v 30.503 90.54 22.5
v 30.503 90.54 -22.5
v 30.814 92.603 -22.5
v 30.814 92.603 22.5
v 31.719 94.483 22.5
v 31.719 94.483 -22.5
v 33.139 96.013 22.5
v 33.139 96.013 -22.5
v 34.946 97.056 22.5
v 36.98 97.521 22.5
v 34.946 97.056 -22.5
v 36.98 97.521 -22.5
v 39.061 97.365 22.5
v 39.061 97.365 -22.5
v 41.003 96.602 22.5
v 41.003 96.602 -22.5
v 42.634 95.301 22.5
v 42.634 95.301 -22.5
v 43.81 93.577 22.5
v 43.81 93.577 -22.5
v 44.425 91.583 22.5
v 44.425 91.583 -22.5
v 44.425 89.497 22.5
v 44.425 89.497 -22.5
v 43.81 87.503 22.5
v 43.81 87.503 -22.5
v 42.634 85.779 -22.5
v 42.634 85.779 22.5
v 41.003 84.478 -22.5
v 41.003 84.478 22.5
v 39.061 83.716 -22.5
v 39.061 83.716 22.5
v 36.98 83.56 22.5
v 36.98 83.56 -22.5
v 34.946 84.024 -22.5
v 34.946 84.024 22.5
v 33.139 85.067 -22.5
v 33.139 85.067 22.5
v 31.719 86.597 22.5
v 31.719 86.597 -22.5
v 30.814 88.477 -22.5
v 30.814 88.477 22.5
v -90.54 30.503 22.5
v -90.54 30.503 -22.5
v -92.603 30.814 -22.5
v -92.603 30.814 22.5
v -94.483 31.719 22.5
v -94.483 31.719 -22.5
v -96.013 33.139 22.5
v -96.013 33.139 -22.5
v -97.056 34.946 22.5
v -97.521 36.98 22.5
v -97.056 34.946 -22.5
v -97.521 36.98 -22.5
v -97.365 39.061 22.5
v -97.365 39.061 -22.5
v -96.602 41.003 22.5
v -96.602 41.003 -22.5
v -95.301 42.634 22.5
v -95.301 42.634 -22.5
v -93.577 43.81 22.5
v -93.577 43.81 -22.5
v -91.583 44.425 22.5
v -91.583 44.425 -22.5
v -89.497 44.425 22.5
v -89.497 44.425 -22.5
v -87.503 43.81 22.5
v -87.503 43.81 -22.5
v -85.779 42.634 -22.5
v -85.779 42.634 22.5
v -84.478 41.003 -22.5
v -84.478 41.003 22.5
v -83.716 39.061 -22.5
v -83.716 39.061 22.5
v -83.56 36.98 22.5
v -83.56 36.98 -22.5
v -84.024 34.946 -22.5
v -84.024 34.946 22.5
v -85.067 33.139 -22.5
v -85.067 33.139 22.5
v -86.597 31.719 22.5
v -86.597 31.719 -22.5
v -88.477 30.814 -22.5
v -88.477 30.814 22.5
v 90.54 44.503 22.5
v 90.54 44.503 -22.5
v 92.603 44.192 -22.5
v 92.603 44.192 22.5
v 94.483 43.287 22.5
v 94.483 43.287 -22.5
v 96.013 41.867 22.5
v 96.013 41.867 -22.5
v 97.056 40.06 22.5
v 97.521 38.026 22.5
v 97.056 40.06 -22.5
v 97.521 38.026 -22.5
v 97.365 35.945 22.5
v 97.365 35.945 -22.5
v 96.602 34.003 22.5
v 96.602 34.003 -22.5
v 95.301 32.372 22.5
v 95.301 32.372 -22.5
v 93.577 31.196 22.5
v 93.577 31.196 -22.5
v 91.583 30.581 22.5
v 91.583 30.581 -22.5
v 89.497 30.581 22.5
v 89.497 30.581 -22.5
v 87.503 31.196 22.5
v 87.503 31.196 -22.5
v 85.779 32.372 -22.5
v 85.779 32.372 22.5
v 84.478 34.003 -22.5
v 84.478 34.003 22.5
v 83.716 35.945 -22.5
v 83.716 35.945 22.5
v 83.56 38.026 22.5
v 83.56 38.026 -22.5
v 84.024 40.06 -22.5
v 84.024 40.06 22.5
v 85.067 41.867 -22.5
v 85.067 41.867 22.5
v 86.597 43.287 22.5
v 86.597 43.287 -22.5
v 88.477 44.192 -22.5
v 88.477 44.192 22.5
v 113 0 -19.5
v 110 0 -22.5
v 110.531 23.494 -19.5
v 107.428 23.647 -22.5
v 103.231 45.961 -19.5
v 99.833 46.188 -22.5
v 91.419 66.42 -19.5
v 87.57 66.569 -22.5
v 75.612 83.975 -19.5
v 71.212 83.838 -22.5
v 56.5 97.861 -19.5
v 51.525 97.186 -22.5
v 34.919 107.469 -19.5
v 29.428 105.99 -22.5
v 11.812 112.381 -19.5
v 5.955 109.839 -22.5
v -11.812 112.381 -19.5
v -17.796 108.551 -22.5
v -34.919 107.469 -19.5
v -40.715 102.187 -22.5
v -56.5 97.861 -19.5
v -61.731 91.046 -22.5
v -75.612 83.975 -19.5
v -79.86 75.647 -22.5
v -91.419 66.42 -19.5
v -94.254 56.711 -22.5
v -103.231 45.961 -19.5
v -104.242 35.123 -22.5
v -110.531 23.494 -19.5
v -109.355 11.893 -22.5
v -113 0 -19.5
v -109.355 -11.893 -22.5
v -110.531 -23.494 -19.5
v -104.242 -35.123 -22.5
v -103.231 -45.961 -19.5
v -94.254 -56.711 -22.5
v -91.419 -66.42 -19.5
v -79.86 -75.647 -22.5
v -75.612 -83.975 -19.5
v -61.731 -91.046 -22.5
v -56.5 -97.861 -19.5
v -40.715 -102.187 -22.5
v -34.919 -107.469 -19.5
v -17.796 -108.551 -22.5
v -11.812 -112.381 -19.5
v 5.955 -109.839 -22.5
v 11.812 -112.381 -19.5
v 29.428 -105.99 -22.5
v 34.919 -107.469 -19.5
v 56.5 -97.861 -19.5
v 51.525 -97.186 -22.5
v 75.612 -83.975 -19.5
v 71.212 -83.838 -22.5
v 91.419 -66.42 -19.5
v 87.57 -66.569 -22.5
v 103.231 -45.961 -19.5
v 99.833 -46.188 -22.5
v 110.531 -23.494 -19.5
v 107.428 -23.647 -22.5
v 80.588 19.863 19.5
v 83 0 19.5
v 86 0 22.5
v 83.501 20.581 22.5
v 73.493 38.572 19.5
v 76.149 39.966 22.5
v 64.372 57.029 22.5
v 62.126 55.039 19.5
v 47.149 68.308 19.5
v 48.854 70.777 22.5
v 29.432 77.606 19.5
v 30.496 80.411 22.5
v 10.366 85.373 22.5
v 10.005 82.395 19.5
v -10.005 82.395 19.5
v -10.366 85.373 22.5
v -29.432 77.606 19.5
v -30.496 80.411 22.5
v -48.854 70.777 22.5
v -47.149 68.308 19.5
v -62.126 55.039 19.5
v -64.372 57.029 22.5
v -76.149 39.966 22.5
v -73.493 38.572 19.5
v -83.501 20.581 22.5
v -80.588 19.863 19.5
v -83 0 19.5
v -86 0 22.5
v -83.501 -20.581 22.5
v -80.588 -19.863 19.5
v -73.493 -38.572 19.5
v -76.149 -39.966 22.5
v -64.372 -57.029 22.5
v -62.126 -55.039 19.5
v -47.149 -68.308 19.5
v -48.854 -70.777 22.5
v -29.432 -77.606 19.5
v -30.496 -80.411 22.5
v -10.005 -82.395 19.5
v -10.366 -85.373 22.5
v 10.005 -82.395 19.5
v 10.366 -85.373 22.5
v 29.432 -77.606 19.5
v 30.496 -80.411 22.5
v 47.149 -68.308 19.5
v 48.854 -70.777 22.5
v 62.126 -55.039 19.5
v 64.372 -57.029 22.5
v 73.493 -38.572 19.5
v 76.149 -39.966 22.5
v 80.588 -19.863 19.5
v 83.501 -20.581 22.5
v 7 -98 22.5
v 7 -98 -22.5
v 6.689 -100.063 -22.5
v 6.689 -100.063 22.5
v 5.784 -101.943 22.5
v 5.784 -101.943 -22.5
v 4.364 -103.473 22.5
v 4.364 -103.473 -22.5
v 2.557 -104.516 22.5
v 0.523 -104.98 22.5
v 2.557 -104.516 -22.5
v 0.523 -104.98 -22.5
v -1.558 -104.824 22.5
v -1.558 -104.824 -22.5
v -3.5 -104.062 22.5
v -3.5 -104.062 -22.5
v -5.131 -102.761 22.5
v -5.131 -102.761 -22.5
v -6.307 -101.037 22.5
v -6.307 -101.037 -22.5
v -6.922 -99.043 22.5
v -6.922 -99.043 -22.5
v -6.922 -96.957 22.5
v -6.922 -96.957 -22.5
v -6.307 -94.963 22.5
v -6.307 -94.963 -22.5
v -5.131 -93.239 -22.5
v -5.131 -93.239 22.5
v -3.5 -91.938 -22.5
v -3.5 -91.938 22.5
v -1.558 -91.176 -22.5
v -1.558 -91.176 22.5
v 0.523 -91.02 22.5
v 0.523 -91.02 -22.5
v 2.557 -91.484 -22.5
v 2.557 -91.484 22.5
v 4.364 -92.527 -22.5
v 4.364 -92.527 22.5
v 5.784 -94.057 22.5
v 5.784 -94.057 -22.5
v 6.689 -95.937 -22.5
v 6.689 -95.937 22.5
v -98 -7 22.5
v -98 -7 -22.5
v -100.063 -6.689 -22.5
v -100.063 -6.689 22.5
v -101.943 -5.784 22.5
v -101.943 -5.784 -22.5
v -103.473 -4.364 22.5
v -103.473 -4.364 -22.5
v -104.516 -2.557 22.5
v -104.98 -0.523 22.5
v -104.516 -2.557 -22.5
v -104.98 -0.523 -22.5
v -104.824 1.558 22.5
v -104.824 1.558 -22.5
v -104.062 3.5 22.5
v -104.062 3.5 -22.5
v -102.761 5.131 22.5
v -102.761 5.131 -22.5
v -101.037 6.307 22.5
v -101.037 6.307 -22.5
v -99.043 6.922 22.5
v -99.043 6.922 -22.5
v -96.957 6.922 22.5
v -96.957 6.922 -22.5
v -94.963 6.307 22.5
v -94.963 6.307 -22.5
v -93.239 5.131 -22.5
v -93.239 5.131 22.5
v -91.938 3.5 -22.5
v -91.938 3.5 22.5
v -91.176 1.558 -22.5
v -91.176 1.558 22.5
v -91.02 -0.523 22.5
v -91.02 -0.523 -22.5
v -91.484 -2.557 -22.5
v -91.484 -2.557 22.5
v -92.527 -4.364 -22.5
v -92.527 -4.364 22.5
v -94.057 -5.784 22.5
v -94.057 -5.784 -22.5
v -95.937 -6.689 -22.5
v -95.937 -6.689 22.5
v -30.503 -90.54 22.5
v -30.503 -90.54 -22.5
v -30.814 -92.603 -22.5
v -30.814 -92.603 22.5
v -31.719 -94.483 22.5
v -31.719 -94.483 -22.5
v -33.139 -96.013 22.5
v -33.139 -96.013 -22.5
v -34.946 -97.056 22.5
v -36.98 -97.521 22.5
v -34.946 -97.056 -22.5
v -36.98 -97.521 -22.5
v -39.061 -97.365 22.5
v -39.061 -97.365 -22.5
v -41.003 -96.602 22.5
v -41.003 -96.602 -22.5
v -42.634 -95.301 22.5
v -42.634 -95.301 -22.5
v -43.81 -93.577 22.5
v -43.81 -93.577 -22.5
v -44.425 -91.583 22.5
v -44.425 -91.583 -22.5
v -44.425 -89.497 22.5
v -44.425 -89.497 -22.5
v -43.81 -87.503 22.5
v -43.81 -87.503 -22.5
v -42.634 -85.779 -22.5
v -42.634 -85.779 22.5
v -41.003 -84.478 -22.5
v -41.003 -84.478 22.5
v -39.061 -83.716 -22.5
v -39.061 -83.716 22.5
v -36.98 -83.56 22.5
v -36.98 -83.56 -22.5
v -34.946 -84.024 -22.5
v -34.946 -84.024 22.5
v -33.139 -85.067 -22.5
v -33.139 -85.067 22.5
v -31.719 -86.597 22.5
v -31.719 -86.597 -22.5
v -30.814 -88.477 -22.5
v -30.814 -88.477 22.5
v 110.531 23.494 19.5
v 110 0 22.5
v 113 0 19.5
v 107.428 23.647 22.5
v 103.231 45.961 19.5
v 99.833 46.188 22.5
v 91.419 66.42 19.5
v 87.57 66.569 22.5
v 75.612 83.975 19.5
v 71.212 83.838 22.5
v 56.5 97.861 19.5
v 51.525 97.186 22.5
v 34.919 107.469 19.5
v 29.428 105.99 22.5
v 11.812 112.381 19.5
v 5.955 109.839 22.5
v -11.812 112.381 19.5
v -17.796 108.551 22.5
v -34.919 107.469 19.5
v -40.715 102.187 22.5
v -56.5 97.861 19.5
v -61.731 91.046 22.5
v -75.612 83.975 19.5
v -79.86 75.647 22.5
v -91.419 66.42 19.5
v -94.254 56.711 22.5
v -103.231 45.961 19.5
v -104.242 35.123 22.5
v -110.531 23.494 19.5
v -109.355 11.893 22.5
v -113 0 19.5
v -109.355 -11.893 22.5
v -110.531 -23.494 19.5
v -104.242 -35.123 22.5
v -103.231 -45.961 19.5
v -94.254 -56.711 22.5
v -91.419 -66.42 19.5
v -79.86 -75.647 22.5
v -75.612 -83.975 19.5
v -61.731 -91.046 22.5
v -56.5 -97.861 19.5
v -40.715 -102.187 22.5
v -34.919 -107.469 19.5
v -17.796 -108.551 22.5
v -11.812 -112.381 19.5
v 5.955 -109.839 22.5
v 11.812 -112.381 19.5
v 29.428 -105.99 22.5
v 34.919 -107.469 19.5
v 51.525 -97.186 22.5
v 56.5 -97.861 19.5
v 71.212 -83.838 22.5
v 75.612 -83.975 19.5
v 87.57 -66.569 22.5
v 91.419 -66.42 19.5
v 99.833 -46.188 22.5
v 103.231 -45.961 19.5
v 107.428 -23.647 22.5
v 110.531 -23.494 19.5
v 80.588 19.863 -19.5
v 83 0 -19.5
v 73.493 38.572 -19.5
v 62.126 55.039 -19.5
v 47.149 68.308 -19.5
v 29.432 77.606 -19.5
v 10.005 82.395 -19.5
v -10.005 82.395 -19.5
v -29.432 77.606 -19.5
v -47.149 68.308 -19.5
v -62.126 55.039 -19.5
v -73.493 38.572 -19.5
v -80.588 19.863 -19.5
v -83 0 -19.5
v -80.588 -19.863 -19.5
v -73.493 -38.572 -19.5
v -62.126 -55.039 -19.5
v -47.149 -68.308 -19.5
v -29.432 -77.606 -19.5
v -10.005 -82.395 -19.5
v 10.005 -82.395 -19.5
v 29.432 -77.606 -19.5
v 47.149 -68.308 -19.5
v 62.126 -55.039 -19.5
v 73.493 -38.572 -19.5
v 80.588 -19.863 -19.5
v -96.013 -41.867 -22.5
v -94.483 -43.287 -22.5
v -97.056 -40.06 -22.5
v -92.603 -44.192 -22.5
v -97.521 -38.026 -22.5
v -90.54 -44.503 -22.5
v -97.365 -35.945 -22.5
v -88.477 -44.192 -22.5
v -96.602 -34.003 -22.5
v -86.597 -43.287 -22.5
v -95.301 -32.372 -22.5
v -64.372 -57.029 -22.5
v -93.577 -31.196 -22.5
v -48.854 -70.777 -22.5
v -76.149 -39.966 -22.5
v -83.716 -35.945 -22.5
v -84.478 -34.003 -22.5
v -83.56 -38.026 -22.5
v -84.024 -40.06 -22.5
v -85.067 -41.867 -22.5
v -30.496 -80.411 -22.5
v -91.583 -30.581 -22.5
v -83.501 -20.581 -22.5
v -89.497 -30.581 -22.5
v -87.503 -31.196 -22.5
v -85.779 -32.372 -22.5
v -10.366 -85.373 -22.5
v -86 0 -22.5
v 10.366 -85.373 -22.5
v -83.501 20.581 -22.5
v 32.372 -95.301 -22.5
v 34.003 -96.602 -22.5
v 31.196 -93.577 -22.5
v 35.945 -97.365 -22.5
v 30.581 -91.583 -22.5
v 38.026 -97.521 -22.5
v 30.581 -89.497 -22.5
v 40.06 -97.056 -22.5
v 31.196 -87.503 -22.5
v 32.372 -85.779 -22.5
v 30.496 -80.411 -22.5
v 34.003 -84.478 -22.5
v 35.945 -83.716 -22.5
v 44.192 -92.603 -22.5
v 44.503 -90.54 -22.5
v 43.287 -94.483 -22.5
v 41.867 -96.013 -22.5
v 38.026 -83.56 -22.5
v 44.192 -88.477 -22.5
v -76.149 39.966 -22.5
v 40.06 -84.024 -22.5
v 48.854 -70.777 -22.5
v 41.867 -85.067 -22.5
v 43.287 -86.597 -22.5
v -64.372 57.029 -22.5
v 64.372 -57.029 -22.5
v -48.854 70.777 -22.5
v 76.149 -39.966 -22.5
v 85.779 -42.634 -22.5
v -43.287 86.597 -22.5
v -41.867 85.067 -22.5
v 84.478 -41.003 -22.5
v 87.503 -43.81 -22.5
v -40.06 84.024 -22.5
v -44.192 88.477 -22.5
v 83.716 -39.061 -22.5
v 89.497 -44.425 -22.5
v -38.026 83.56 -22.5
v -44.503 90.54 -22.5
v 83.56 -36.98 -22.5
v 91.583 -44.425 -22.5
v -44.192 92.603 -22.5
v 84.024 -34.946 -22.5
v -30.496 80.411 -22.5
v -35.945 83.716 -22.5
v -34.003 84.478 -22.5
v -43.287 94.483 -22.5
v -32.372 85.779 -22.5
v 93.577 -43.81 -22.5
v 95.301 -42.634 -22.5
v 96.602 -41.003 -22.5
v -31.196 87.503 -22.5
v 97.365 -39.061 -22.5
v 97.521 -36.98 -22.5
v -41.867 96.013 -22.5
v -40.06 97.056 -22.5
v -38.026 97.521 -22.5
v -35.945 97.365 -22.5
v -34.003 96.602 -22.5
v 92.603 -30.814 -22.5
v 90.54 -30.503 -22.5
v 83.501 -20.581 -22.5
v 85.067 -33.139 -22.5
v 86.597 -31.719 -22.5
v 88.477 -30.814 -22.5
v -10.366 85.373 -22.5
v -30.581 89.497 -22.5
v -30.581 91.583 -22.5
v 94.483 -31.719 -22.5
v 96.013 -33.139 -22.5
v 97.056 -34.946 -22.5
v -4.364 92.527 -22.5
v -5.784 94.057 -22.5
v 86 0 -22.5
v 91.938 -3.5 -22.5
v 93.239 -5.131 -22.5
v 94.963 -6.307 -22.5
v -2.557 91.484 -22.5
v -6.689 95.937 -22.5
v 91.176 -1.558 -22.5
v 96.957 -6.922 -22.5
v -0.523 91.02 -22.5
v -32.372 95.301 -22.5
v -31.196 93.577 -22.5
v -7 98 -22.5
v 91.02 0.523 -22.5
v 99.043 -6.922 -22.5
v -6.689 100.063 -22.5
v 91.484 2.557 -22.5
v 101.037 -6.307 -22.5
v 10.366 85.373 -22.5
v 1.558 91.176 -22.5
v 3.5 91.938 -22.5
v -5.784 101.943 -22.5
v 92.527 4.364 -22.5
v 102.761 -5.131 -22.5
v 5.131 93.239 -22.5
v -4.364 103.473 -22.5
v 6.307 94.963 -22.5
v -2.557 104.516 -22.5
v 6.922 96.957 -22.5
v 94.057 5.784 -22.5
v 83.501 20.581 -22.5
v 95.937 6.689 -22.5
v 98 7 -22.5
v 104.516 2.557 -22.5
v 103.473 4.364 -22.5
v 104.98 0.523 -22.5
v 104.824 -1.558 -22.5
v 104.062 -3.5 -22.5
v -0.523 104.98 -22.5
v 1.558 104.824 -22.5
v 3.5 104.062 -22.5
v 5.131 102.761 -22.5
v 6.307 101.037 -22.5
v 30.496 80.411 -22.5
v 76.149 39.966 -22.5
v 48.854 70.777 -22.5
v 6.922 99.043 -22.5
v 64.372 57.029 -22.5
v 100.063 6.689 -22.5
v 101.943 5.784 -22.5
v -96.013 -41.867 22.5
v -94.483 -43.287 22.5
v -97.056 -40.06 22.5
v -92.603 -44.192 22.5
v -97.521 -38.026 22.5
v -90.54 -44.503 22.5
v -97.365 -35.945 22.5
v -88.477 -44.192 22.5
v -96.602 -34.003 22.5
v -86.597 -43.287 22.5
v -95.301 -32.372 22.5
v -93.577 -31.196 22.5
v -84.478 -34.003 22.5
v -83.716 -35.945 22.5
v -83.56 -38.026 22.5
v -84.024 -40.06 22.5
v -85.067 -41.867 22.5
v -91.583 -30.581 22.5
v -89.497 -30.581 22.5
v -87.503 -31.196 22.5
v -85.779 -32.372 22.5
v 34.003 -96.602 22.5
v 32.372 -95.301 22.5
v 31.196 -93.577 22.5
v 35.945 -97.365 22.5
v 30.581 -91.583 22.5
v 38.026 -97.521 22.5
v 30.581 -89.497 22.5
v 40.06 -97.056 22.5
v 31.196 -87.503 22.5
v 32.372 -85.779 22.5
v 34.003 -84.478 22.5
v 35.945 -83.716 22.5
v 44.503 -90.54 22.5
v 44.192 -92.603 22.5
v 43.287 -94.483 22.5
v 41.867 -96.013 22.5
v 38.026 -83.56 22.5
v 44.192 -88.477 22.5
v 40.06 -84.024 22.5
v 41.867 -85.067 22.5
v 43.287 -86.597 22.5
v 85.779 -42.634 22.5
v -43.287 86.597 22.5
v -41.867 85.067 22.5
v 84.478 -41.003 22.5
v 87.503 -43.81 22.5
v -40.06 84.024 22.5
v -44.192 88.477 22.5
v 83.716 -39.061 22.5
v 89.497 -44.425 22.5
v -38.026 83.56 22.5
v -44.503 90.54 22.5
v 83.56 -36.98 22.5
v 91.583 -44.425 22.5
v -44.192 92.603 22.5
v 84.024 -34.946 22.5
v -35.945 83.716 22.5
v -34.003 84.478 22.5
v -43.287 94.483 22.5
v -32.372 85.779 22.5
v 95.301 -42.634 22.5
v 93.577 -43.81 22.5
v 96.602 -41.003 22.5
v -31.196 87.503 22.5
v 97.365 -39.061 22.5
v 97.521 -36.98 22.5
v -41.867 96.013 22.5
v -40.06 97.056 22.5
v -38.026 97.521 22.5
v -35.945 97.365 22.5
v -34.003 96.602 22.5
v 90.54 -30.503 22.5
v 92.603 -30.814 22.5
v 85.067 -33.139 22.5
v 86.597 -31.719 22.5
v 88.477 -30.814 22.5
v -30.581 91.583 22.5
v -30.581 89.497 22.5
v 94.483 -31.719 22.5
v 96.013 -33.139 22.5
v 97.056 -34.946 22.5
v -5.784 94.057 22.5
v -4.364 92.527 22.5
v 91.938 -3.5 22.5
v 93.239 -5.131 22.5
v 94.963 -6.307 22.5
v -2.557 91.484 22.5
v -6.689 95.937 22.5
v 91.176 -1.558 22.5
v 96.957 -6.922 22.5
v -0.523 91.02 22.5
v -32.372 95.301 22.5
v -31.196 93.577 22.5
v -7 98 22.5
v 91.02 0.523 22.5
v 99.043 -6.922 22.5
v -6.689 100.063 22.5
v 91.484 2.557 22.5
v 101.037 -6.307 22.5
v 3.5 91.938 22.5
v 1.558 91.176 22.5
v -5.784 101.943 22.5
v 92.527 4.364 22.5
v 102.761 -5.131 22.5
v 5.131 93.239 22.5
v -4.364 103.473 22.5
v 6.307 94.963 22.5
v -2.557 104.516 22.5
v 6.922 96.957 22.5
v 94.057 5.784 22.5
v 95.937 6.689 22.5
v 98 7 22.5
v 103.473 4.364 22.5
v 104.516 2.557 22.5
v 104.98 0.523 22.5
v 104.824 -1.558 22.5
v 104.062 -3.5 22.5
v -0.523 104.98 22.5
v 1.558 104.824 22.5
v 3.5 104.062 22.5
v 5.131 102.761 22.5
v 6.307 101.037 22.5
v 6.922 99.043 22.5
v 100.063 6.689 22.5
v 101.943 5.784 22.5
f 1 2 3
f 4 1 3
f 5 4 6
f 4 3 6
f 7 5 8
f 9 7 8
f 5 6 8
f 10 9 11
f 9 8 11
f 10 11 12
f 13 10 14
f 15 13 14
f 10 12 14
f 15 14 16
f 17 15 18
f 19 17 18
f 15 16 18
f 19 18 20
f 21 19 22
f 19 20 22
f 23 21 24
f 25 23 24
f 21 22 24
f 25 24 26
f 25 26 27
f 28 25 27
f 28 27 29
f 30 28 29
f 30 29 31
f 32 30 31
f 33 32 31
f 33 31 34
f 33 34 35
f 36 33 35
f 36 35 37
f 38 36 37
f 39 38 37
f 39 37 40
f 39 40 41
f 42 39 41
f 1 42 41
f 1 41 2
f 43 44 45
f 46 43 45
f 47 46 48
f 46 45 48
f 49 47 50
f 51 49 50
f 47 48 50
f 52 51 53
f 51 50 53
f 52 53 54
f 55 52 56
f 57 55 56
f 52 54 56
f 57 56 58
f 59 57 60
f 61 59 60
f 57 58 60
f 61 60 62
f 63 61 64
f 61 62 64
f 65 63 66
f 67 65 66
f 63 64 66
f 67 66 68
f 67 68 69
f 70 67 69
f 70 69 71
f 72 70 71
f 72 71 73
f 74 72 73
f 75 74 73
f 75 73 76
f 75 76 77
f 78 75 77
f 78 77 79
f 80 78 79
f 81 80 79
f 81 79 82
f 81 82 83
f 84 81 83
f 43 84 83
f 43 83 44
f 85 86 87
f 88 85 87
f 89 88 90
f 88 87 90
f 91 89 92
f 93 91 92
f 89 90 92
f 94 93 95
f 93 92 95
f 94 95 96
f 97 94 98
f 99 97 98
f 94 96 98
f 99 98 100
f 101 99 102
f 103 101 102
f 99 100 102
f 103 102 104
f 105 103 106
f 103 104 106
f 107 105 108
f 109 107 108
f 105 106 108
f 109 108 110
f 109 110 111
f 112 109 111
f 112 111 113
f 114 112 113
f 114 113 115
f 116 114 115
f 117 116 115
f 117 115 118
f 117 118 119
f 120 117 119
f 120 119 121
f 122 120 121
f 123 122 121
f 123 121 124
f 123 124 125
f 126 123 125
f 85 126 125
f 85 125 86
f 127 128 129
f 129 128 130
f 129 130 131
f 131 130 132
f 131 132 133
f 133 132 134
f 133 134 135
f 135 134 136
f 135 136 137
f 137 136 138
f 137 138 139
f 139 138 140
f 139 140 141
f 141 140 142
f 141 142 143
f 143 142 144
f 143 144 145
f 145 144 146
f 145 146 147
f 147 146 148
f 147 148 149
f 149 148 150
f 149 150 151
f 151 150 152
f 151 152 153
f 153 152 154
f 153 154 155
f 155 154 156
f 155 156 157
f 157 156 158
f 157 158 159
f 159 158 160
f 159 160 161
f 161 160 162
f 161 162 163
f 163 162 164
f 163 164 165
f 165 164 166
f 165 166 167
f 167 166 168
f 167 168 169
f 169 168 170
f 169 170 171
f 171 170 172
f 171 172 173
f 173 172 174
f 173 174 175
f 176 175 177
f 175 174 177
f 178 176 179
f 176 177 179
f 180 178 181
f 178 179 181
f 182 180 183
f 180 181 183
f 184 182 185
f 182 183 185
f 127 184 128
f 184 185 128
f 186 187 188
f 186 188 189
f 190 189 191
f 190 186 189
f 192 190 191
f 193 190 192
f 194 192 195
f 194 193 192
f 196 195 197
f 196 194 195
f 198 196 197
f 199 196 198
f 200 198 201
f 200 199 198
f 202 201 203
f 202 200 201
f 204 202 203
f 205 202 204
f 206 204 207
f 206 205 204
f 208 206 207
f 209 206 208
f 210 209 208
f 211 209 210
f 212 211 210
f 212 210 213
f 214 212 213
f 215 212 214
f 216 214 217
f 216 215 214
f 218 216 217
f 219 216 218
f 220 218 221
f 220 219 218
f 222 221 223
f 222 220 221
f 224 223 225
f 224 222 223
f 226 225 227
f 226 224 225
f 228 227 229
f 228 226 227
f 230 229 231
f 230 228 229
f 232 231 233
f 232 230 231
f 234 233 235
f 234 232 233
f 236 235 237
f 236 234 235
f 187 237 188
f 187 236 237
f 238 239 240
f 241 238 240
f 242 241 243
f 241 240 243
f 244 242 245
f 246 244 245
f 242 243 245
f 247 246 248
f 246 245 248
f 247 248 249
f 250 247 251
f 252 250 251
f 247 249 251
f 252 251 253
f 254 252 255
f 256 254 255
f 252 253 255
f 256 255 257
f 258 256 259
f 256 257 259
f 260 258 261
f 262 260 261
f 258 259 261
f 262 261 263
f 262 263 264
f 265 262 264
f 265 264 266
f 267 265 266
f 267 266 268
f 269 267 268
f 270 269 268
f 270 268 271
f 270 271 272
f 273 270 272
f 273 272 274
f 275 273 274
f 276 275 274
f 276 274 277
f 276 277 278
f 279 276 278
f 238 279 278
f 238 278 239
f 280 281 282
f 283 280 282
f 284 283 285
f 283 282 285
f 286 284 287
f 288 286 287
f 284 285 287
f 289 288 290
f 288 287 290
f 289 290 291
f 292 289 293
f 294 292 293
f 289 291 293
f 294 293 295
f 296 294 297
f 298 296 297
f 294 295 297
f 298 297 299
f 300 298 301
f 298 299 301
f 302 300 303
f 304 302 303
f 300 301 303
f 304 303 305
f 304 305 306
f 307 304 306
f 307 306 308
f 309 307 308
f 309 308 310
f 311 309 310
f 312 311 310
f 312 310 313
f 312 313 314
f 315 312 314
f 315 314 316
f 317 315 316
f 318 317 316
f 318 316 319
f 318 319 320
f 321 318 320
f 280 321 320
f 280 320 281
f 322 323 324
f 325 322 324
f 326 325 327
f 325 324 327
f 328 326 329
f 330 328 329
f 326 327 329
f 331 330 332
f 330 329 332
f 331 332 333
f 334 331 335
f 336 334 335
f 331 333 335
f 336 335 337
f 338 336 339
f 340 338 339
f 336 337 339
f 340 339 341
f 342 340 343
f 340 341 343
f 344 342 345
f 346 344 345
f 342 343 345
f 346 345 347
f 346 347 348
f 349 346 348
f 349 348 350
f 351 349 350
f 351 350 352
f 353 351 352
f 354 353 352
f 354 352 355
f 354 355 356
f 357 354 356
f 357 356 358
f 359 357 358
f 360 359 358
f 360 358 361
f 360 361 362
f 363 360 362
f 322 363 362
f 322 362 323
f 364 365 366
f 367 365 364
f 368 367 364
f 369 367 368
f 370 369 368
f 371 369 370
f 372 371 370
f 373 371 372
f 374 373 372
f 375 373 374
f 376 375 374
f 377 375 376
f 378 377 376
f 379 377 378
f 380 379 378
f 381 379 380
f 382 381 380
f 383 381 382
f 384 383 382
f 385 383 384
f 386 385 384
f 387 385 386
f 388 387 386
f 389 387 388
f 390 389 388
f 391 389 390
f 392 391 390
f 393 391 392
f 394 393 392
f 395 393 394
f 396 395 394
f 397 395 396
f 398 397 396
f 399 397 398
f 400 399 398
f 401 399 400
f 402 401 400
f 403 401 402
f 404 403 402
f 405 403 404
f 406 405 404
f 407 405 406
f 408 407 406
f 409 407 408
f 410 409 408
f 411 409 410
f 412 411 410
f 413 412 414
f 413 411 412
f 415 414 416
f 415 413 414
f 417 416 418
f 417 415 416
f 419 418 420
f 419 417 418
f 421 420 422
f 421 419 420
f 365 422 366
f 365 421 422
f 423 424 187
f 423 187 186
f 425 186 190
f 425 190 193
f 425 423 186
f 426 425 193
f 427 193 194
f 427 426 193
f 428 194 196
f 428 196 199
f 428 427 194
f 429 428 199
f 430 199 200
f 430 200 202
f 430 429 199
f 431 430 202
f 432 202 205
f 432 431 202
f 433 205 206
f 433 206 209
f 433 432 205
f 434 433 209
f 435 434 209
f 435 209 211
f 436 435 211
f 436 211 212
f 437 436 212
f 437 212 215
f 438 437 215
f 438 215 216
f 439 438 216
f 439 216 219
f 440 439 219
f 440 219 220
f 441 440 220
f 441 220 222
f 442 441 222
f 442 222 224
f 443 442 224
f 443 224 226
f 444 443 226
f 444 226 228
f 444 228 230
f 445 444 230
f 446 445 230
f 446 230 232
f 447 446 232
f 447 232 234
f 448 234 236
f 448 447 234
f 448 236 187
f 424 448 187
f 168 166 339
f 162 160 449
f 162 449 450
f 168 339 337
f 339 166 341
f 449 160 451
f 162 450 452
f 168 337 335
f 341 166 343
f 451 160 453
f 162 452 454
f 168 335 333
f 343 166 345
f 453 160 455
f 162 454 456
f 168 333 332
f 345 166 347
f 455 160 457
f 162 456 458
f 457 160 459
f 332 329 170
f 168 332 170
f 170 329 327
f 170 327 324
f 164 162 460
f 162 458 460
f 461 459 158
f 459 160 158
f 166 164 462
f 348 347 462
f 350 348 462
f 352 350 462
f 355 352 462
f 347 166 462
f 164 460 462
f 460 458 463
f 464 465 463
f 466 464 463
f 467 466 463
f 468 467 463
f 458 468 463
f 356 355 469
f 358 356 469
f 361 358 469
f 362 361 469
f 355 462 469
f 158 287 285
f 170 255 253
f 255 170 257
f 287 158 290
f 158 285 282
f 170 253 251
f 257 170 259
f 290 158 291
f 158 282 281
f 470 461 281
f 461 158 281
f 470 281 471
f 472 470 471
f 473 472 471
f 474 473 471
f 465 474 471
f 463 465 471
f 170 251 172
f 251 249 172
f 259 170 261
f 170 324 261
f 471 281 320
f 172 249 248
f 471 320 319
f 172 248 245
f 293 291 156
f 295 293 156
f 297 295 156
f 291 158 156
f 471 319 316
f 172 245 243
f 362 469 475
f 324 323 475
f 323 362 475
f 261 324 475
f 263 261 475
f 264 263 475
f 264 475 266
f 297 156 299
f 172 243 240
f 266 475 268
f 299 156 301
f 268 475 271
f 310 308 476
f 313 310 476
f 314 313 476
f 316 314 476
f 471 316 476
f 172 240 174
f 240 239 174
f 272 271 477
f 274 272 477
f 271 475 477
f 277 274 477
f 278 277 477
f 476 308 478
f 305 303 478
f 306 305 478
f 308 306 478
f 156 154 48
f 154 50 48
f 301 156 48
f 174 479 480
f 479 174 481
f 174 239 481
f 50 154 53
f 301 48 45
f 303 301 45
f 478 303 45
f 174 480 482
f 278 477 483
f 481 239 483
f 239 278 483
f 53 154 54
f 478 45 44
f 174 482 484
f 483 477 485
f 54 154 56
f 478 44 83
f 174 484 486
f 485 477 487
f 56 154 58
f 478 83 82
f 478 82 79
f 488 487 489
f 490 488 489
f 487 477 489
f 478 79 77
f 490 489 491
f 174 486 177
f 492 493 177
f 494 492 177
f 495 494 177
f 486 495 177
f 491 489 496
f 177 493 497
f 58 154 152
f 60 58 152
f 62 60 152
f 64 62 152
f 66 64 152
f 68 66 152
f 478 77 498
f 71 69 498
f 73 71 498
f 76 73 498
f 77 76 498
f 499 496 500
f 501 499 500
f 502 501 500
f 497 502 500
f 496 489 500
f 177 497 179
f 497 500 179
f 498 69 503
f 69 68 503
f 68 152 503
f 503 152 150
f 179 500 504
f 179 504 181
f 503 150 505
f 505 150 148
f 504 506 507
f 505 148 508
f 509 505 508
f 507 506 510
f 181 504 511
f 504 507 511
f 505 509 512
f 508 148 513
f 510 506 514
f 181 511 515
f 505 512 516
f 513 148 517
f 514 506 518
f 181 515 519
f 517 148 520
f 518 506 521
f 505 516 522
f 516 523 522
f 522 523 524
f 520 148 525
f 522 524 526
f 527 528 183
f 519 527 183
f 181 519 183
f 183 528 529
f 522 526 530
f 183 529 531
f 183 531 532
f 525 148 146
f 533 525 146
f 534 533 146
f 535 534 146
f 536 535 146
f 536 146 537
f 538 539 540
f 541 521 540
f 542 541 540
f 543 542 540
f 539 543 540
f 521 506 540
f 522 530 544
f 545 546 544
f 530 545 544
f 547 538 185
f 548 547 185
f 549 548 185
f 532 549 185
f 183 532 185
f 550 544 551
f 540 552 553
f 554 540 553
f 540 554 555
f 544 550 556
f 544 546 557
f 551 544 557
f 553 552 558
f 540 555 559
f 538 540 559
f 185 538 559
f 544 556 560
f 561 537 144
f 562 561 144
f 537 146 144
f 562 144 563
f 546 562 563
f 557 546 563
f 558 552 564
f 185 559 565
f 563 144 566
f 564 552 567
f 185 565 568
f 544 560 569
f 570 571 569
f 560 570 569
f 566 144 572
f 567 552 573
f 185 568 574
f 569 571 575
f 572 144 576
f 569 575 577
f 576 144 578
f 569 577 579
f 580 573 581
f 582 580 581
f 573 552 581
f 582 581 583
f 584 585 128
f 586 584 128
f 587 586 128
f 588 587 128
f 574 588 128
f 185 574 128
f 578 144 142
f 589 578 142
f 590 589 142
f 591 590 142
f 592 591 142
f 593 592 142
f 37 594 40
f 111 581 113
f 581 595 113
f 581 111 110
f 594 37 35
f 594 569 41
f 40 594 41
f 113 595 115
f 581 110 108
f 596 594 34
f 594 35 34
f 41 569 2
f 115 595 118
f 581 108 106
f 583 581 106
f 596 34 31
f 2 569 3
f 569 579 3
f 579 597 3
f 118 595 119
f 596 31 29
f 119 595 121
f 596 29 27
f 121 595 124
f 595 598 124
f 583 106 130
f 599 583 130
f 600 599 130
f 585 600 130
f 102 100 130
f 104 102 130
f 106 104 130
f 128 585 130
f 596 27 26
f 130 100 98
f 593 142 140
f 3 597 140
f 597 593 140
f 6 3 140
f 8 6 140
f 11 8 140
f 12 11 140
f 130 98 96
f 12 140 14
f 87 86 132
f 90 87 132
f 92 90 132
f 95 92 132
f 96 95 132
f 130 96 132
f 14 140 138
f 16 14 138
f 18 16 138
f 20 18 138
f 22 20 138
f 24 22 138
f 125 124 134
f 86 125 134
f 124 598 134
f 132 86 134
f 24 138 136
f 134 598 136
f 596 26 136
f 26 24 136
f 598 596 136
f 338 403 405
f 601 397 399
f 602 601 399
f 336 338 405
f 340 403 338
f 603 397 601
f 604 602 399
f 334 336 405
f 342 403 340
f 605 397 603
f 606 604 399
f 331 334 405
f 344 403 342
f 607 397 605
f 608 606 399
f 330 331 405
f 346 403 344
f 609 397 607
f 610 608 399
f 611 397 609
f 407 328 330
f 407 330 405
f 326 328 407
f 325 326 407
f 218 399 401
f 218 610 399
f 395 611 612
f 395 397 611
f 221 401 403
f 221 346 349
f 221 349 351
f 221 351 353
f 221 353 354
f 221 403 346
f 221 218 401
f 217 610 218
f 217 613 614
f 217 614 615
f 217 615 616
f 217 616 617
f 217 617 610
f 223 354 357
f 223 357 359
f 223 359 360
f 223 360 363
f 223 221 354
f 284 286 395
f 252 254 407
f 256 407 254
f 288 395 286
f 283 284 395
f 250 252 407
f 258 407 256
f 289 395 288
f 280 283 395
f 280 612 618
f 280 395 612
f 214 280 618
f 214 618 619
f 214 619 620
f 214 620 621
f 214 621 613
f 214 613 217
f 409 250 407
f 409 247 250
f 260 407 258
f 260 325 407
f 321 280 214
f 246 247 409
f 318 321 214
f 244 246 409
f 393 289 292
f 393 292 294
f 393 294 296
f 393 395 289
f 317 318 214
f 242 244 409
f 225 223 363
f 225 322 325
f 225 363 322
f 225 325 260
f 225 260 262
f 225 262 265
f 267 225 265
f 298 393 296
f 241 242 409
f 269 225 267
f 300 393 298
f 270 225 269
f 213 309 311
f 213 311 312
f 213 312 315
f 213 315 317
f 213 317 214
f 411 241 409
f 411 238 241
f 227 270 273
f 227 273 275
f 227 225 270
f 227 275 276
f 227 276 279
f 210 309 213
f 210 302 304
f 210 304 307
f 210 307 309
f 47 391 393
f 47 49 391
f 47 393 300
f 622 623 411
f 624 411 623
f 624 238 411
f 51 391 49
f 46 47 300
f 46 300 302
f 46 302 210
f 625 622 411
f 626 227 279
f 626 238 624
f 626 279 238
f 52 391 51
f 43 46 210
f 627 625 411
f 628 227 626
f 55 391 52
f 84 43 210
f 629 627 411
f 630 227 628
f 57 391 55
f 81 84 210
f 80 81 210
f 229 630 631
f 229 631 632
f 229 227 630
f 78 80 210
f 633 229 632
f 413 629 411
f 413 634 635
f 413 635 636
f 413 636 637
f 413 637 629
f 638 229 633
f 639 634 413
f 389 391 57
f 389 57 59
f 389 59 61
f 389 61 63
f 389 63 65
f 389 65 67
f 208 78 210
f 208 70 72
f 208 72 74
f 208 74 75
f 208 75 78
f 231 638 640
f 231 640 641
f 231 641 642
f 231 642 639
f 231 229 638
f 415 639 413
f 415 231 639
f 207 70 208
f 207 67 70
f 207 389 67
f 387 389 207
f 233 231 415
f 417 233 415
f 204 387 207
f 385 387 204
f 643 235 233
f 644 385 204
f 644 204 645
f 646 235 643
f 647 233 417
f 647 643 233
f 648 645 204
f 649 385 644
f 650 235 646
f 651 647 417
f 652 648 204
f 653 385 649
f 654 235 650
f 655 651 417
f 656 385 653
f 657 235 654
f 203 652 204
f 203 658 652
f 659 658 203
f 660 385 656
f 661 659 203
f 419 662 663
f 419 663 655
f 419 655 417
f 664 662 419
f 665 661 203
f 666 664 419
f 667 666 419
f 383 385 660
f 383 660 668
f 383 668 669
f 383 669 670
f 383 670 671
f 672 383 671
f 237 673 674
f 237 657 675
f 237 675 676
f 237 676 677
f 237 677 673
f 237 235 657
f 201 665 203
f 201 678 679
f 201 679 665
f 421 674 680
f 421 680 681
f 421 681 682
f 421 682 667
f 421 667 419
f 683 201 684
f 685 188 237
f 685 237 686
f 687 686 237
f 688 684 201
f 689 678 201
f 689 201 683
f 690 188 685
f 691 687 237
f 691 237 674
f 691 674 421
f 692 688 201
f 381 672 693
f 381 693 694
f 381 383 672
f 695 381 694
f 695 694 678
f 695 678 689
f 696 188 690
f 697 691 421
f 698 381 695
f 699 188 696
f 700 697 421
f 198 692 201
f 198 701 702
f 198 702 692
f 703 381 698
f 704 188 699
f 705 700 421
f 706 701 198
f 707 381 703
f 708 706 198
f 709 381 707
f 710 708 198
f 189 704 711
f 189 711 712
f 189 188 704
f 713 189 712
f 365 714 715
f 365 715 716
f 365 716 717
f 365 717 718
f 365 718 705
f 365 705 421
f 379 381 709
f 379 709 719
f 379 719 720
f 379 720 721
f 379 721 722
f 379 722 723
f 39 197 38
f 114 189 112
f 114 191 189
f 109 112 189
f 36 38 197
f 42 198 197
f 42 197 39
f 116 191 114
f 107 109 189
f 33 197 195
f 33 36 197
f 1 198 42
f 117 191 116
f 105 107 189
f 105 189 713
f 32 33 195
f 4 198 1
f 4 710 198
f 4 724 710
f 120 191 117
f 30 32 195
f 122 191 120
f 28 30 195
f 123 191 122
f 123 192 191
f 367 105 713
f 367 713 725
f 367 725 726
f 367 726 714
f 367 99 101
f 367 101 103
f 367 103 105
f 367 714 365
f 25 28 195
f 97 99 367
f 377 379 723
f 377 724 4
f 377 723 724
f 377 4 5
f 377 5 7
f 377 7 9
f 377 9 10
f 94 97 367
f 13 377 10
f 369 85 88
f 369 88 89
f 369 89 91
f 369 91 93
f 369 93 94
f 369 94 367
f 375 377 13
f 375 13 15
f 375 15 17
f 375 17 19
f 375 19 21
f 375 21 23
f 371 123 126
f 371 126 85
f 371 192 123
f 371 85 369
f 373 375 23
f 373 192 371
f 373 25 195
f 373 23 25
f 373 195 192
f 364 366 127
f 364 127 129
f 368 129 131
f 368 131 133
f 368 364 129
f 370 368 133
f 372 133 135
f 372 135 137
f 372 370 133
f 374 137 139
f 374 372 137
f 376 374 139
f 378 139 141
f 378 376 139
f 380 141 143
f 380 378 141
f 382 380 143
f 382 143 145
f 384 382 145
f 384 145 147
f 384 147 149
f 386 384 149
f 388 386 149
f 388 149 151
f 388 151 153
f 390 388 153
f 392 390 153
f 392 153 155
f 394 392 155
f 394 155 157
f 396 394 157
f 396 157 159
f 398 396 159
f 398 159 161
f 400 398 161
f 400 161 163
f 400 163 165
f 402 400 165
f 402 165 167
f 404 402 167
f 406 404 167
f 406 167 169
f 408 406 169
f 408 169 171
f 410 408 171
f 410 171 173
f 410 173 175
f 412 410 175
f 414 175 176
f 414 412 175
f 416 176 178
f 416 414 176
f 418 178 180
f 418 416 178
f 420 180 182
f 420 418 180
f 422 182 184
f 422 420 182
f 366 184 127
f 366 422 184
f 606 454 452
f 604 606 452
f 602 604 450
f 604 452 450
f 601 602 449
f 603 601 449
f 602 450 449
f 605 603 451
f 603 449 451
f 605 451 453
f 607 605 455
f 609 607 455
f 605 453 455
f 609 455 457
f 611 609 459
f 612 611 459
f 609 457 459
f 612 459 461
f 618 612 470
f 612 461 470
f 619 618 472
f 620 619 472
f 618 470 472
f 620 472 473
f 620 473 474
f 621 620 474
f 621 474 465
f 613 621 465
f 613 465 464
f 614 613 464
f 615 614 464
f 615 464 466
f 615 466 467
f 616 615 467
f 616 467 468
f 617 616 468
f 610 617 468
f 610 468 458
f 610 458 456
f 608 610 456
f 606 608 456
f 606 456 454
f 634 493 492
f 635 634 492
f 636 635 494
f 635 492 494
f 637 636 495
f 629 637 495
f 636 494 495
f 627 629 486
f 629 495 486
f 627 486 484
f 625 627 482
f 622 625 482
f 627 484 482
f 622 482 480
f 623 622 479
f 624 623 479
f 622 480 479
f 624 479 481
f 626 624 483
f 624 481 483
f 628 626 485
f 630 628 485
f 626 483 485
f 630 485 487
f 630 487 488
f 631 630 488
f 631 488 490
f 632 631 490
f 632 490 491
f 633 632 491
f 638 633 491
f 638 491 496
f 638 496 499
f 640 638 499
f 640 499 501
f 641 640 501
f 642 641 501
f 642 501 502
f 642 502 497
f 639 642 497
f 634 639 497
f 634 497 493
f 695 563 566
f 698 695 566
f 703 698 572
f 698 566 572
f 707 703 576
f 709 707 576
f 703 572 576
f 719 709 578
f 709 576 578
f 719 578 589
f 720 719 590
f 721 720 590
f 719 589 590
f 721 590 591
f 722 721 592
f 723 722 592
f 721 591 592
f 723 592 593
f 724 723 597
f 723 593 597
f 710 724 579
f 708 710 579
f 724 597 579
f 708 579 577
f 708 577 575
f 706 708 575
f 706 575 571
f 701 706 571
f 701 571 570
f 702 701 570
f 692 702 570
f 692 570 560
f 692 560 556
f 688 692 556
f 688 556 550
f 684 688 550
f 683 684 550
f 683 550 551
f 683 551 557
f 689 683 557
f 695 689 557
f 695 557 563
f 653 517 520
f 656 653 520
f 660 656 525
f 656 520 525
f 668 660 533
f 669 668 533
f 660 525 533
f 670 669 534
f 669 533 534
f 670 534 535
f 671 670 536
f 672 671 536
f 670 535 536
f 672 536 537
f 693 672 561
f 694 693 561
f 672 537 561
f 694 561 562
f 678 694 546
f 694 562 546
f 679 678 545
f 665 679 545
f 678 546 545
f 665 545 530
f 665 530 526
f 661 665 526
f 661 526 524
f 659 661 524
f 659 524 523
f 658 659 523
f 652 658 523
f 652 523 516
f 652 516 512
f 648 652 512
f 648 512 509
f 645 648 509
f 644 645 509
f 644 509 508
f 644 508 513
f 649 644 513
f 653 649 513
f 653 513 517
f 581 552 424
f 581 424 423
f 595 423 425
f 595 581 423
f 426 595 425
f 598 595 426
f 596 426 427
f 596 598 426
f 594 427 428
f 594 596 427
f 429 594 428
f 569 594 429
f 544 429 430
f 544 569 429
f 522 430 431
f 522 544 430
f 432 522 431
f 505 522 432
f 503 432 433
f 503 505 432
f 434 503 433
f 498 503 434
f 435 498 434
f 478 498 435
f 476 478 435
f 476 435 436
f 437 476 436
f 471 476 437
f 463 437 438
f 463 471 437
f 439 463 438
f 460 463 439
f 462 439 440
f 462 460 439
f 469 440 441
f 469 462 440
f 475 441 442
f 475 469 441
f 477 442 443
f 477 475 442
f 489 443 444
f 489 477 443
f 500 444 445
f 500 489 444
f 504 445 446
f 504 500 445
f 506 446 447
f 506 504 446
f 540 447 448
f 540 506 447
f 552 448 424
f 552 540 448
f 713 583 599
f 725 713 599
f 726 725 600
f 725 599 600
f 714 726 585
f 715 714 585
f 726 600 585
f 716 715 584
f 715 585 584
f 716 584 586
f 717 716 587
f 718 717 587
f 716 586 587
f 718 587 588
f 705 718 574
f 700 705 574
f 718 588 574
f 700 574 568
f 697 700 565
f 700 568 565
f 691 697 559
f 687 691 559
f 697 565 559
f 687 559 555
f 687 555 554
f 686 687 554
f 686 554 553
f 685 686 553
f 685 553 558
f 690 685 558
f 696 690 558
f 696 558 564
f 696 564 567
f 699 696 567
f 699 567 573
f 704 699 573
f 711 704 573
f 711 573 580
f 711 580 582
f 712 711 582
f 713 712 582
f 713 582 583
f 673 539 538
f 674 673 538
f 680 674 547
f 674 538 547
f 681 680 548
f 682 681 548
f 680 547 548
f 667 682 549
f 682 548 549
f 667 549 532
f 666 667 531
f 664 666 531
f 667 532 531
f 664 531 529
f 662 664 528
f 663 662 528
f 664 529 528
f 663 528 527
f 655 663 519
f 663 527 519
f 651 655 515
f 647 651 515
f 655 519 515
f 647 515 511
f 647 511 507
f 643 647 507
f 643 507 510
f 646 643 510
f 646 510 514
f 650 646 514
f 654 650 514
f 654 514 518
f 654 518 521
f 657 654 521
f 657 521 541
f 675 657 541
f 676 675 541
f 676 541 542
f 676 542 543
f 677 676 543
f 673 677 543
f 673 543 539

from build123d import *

# Parameters (mm, degrees)
SKETCH1_R              = 113
SKETCH1_R_2            = 83
BOSS_EXTRUDE1_DEPTH    = 22.5
CHAMFER1_SIZE          = 3
M16X2_0_TAPPED_HOLE1_D = 14
CIRPATTERN1_COUNT      = 4


with BuildPart() as part:
    # Sketch1 → Boss-Extrude1 (new body, symmetric)
    with BuildSketch(Plane.XY):
        Circle(SKETCH1_R)
        Circle(SKETCH1_R_2, mode=Mode.SUBTRACT)
    extrude(amount=BOSS_EXTRUDE1_DEPTH, both=True)

    # Chamfer1
    chamfer1_edges = [part.edges().sort_by_distance(p)[0] for p in [
        (-113, 0, -22.5),
        (-113, 0, 22.5),
        (-83, 0, -22.5),
        (-83, 0, 22.5),
    ]]
    chamfer(chamfer1_edges, length=CHAMFER1_SIZE)

    # M16x2.0 Tapped Hole1 (through all)
    with Locations(Plane.XY.offset(22.5)):
        with Locations((-37.502976372, 90.540194186), (37.502976372, 90.540194186), (0, 98)):
            m16x2_0_tapped_hole1 = Hole(M16X2_0_TAPPED_HOLE1_D / 2)

    # CirPattern1: M16x2.0 Tapped Hole1 ×4 about axis
    cirpattern1_axis = Axis((0, 0, 0), (0, 0, 1))
    for i in range(1, CIRPATTERN1_COUNT):
        add(m16x2_0_tapped_hole1.rotate(cirpattern1_axis, i * 360 / CIRPATTERN1_COUNT), mode=Mode.SUBTRACT)


solid = part.part
